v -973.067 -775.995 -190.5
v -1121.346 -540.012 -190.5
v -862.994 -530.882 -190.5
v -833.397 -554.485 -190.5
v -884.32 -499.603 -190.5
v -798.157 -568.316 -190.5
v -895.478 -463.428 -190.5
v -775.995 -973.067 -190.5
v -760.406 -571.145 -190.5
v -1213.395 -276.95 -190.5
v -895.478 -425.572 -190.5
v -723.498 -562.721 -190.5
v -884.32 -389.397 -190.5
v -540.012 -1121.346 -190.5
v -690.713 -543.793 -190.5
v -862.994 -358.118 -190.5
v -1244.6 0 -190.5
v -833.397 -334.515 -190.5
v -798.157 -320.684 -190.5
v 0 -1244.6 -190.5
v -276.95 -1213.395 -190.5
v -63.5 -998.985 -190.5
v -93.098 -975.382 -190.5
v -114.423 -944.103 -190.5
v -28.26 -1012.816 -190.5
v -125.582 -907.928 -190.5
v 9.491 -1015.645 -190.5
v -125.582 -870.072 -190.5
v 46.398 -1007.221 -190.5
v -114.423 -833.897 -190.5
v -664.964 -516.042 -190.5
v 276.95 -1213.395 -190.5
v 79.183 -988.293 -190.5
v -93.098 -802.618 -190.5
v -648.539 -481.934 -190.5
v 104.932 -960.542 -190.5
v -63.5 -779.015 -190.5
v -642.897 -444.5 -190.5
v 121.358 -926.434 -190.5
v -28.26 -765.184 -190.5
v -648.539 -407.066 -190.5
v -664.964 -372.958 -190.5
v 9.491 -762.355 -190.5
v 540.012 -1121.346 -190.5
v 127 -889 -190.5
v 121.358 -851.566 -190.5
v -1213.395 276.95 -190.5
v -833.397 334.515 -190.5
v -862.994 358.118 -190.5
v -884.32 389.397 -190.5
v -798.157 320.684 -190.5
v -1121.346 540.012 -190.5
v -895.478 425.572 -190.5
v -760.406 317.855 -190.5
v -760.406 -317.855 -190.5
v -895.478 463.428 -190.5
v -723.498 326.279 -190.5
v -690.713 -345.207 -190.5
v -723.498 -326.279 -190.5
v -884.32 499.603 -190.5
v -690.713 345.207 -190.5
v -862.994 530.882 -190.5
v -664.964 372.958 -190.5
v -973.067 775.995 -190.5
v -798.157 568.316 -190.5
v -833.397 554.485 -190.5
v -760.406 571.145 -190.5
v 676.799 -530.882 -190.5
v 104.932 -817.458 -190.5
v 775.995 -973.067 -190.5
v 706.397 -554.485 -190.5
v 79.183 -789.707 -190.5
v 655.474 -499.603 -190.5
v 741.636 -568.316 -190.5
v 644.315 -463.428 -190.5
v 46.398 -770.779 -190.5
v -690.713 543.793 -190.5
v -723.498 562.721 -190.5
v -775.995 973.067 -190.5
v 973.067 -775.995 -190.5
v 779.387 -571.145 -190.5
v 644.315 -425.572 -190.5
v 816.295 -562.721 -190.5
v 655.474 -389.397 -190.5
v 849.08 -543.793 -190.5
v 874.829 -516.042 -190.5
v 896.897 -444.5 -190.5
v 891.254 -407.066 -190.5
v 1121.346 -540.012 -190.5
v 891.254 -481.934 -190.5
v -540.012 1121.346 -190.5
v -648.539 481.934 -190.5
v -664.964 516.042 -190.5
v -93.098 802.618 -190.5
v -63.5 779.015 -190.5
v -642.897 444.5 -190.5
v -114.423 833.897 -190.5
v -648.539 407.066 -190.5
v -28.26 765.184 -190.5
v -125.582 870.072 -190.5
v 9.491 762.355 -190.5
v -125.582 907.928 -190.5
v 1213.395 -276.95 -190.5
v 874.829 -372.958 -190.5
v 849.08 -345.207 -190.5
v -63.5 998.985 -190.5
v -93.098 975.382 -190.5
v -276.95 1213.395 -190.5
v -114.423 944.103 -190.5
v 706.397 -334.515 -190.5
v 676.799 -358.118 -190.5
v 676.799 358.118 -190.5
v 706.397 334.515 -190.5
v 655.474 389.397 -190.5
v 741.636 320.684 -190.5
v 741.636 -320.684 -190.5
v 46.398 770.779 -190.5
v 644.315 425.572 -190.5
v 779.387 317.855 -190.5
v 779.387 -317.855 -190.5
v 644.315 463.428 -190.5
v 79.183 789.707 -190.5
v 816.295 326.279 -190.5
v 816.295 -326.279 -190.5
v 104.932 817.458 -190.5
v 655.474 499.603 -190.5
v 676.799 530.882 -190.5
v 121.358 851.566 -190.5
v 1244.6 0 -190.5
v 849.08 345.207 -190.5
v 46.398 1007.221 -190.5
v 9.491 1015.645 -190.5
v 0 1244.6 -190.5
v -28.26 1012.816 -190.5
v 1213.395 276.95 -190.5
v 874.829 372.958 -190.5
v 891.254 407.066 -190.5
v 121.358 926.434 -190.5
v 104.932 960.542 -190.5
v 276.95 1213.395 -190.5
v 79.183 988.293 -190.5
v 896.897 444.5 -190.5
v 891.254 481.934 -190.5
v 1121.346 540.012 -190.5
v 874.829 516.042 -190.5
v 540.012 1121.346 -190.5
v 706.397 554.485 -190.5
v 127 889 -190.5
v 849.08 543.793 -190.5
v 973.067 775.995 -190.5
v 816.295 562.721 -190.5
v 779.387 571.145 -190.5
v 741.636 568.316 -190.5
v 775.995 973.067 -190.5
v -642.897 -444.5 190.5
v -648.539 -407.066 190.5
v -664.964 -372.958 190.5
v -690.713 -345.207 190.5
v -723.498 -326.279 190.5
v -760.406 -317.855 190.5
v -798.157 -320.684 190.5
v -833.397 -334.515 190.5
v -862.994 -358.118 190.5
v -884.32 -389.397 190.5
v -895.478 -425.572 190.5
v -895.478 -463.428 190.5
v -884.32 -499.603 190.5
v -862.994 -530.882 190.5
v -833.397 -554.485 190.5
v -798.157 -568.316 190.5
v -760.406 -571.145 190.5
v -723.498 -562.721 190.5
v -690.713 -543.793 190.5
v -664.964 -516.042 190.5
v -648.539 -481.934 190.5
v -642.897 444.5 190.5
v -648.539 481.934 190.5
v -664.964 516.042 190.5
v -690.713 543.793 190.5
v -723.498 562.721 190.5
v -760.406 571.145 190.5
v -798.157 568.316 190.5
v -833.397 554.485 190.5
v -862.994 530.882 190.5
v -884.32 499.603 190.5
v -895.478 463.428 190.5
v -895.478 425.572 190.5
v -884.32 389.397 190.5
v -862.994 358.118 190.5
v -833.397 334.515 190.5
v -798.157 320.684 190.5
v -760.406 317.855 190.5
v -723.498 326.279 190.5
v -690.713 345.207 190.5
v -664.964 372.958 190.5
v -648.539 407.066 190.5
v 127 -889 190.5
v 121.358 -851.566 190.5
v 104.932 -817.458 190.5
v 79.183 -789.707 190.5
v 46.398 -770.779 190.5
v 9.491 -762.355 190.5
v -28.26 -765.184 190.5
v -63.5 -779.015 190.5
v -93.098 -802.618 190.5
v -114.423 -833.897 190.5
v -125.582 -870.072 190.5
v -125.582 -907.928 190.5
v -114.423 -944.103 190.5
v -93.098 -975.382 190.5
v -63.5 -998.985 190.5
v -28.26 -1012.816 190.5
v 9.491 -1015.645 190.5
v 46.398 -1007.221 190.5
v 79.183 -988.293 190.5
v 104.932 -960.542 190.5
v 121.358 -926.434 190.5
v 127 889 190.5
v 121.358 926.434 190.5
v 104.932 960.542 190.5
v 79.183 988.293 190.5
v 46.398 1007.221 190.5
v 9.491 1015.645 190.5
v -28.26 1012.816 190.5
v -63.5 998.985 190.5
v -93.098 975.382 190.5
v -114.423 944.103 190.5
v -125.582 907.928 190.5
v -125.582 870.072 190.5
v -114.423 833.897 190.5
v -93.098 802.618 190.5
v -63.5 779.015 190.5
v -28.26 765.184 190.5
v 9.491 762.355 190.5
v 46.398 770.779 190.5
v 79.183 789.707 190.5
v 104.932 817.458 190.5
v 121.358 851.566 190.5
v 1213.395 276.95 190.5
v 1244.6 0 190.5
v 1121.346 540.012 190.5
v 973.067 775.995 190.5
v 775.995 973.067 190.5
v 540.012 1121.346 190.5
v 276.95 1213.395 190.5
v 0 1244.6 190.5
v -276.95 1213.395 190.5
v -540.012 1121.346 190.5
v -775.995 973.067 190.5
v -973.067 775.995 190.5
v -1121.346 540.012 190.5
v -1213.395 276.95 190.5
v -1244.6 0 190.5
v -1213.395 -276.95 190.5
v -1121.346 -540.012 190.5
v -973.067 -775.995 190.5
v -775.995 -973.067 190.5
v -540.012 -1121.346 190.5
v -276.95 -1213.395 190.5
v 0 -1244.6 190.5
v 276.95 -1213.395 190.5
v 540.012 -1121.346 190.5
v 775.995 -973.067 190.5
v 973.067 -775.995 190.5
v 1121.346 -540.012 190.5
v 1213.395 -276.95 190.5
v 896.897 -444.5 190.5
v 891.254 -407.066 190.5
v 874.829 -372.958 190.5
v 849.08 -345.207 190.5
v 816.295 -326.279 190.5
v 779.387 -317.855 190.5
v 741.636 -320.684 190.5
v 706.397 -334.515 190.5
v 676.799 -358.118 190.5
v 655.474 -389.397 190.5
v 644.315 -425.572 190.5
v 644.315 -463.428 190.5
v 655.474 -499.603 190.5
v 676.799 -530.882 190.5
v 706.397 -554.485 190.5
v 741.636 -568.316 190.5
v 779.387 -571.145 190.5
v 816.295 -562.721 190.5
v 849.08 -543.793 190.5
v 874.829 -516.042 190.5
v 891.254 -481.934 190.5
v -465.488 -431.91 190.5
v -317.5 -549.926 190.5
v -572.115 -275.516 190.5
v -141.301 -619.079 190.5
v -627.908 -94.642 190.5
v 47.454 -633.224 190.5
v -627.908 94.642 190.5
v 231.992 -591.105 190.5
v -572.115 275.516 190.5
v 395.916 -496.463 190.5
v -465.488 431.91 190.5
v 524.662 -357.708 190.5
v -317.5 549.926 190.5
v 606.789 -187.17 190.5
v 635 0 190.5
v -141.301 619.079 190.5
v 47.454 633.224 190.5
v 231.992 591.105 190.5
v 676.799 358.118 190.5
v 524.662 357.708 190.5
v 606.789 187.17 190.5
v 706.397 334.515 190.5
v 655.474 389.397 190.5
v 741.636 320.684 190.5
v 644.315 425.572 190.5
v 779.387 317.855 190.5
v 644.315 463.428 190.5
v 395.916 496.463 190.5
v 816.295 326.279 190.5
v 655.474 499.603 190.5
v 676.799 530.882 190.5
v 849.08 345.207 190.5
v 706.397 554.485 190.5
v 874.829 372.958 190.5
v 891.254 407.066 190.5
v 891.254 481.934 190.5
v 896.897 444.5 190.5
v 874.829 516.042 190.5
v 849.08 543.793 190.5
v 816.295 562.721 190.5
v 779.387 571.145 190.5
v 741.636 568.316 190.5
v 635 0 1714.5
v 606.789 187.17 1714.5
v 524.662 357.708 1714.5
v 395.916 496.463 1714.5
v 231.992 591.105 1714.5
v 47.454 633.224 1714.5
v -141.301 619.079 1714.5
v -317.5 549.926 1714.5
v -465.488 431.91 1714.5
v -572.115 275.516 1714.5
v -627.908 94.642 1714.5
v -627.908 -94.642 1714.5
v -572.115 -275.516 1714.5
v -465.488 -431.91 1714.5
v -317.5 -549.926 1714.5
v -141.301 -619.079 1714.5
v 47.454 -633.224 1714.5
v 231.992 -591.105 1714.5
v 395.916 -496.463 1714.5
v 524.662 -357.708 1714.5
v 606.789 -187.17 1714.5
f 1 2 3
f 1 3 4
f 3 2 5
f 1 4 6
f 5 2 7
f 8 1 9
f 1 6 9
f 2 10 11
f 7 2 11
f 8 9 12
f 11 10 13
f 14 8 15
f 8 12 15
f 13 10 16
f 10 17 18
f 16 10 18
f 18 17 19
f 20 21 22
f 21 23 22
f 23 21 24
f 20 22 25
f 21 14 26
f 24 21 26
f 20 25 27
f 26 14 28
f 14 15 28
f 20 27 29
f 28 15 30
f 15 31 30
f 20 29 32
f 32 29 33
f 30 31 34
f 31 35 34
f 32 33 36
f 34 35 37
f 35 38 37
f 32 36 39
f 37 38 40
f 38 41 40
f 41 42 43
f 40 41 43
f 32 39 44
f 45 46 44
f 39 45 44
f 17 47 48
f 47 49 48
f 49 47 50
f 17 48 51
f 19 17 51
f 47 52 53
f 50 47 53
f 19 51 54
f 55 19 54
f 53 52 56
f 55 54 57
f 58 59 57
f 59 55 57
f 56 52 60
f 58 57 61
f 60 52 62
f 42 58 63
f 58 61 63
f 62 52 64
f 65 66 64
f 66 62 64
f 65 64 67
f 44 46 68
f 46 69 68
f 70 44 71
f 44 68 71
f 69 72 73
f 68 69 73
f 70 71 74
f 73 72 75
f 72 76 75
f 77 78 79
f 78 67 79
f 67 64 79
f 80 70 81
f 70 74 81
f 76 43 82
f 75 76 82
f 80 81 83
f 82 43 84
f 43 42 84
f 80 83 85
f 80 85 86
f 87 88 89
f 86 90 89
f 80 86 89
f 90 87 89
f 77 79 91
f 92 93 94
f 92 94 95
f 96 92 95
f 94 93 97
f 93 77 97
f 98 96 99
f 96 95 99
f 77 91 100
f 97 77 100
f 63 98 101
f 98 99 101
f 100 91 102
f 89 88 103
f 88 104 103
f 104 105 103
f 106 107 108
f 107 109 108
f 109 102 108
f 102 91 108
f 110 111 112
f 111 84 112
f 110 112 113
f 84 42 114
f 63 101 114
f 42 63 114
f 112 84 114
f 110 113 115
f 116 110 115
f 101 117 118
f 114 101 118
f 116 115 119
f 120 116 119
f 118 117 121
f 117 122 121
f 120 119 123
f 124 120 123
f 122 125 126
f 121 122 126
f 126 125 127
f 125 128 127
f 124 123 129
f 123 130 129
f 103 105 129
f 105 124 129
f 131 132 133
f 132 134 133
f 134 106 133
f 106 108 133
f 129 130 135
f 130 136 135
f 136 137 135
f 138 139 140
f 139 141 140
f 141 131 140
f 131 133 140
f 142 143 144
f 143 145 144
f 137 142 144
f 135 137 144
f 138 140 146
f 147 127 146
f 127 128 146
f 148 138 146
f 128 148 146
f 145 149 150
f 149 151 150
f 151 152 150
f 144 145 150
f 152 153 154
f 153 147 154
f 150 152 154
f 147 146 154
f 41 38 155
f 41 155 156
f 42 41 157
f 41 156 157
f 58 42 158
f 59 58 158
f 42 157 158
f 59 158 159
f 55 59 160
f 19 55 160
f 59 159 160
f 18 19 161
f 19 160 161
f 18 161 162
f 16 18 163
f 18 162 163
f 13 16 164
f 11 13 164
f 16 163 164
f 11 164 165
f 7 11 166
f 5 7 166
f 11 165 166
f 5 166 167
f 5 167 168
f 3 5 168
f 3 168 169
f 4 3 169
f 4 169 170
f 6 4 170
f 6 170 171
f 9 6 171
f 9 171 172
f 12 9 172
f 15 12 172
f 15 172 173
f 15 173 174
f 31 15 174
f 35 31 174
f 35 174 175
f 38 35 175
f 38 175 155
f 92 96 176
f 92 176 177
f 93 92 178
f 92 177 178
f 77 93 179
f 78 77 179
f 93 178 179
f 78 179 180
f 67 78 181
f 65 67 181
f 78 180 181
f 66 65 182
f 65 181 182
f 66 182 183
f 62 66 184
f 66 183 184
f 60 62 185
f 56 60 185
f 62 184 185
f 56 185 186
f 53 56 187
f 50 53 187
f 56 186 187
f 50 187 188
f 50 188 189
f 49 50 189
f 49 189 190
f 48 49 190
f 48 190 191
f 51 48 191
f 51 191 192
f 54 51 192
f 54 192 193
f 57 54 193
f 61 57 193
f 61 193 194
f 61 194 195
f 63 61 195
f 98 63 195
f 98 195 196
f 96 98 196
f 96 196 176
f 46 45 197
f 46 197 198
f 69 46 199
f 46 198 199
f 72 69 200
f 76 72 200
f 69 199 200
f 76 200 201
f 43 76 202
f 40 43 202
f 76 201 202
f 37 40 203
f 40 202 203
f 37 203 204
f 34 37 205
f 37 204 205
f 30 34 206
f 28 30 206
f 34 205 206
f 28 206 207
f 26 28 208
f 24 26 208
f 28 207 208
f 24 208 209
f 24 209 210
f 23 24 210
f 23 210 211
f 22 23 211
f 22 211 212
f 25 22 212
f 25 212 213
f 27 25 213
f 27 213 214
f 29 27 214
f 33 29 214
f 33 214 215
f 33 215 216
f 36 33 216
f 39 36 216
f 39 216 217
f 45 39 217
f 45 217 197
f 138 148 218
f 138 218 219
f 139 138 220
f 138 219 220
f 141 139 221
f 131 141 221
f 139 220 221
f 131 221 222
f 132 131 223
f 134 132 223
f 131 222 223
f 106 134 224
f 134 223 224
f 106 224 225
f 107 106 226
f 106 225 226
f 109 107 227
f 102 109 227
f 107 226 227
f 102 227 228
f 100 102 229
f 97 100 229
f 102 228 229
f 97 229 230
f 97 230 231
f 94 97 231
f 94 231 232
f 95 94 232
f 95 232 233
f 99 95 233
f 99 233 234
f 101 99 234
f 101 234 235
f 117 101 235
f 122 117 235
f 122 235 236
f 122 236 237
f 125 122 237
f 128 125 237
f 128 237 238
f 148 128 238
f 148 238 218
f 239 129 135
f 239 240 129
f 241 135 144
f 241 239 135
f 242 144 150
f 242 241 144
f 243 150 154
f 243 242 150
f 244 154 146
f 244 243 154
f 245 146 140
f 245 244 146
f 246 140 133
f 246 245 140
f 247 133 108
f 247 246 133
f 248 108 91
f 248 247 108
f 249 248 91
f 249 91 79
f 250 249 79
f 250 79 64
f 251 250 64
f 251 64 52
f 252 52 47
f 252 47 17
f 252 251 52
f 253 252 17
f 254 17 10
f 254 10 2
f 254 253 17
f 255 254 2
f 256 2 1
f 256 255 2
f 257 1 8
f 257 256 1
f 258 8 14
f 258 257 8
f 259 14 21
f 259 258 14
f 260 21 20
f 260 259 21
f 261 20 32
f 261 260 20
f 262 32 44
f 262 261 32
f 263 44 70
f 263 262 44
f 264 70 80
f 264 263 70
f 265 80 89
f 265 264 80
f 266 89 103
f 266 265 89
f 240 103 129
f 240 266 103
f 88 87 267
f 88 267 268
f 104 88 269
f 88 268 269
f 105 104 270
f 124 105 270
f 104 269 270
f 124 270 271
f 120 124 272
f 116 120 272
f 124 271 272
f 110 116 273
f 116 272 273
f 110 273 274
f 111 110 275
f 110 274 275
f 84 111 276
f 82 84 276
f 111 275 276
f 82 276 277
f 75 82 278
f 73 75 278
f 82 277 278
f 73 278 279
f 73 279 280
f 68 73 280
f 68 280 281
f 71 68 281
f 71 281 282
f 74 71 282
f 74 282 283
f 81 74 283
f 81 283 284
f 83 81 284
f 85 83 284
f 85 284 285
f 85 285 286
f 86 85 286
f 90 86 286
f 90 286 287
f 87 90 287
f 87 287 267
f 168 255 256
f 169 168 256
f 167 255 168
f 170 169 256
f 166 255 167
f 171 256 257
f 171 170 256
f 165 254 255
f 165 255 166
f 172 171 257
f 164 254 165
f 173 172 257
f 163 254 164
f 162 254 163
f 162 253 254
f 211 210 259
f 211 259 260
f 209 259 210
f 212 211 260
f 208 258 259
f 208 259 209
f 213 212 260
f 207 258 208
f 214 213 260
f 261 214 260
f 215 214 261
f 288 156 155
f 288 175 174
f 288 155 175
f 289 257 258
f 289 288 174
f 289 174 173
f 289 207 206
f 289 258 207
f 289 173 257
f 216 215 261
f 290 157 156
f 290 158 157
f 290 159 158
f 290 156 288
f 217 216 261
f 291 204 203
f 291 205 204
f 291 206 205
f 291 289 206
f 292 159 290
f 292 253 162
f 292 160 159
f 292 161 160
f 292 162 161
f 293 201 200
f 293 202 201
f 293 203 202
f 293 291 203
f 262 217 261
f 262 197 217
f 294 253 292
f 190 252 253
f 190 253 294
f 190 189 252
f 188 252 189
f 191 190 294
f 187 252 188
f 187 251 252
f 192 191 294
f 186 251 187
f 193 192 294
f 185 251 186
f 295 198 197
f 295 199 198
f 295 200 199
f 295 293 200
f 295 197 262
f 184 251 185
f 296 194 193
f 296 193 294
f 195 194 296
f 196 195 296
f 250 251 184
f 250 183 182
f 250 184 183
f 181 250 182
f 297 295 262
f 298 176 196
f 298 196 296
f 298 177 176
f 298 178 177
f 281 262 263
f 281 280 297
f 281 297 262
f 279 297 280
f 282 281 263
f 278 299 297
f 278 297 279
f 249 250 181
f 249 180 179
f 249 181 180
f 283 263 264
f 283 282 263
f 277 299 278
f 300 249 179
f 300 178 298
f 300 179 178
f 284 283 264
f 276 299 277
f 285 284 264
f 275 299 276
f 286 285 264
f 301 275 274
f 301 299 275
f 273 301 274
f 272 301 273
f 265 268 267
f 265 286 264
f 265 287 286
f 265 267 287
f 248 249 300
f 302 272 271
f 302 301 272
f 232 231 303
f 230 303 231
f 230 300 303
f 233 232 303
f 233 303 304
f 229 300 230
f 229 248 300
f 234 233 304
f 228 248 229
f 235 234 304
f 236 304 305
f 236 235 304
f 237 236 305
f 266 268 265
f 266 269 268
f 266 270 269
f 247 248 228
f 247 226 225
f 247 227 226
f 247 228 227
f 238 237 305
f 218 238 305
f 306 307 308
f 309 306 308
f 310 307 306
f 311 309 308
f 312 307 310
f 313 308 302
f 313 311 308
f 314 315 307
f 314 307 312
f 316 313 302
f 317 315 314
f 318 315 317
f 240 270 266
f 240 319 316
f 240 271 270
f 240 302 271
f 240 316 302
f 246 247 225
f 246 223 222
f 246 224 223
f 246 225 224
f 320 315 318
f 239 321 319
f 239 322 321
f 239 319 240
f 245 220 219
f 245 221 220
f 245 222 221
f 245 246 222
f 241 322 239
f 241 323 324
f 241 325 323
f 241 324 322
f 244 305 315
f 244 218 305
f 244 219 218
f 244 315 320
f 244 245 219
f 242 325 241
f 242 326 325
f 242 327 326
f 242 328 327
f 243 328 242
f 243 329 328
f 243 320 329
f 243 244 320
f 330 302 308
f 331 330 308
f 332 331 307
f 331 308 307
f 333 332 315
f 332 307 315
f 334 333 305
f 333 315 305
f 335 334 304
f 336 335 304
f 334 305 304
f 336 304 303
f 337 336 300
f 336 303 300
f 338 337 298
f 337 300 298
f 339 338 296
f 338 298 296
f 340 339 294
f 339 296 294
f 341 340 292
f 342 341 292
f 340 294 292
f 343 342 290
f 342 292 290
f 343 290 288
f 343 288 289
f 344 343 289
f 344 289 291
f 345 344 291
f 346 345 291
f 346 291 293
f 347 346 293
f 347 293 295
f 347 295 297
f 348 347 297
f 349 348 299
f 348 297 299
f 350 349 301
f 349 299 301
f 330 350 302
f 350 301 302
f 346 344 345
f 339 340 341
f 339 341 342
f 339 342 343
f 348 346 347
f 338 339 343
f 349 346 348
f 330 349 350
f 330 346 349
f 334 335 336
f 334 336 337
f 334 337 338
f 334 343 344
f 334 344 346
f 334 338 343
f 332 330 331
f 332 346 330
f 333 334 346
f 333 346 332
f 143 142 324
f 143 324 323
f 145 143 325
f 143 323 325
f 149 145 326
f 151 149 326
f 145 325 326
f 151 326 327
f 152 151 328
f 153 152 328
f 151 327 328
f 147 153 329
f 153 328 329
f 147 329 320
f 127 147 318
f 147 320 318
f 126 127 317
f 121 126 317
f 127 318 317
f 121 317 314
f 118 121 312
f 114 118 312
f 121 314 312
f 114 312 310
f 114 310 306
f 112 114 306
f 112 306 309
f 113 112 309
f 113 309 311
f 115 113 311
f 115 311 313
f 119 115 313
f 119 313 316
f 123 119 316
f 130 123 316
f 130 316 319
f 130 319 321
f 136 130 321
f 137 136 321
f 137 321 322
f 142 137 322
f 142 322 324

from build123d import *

# Parameters (mm, degrees)
SKETCH1_R           = 1244.6
BOSS_EXTRUDE1_DEPTH = 190.5
SKETCH2_R           = 127
CUT_EXTRUDE1_DEPTH  = 1801.894033529
SKETCH3_R           = 635
BOSS_EXTRUDE2_DEPTH = 1524


with BuildPart() as part:
    # Sketch1 → Boss-Extrude1 (new, symmetric)
    with BuildSketch(Plane.XY):
        Circle(SKETCH1_R)
    extrude(amount=BOSS_EXTRUDE1_DEPTH, both=True)

    # Sketch2 → Cut-Extrude1 (cut, through all)
    with BuildSketch(Plane.XY.offset(190.5)):
        with Locations((0, 889)):
            Circle(SKETCH2_R)
        with Locations((769.896583964, 444.5)):
            Circle(SKETCH2_R)
        with Locations((769.896583964, -444.5)):
            Circle(SKETCH2_R)
        with Locations((0, -889)):
            Circle(SKETCH2_R)
        with Locations((-769.896583964, -444.5)):
            Circle(SKETCH2_R)
        with Locations((-769.896583964, 444.5)):
            Circle(SKETCH2_R)
    extrude(amount=-CUT_EXTRUDE1_DEPTH, mode=Mode.SUBTRACT)

    # Sketch3 → Boss-Extrude2 (add)
    with BuildSketch(Plane.XY.offset(190.5)):
        Circle(SKETCH3_R)
    extrude(amount=BOSS_EXTRUDE2_DEPTH)


solid = part.part
